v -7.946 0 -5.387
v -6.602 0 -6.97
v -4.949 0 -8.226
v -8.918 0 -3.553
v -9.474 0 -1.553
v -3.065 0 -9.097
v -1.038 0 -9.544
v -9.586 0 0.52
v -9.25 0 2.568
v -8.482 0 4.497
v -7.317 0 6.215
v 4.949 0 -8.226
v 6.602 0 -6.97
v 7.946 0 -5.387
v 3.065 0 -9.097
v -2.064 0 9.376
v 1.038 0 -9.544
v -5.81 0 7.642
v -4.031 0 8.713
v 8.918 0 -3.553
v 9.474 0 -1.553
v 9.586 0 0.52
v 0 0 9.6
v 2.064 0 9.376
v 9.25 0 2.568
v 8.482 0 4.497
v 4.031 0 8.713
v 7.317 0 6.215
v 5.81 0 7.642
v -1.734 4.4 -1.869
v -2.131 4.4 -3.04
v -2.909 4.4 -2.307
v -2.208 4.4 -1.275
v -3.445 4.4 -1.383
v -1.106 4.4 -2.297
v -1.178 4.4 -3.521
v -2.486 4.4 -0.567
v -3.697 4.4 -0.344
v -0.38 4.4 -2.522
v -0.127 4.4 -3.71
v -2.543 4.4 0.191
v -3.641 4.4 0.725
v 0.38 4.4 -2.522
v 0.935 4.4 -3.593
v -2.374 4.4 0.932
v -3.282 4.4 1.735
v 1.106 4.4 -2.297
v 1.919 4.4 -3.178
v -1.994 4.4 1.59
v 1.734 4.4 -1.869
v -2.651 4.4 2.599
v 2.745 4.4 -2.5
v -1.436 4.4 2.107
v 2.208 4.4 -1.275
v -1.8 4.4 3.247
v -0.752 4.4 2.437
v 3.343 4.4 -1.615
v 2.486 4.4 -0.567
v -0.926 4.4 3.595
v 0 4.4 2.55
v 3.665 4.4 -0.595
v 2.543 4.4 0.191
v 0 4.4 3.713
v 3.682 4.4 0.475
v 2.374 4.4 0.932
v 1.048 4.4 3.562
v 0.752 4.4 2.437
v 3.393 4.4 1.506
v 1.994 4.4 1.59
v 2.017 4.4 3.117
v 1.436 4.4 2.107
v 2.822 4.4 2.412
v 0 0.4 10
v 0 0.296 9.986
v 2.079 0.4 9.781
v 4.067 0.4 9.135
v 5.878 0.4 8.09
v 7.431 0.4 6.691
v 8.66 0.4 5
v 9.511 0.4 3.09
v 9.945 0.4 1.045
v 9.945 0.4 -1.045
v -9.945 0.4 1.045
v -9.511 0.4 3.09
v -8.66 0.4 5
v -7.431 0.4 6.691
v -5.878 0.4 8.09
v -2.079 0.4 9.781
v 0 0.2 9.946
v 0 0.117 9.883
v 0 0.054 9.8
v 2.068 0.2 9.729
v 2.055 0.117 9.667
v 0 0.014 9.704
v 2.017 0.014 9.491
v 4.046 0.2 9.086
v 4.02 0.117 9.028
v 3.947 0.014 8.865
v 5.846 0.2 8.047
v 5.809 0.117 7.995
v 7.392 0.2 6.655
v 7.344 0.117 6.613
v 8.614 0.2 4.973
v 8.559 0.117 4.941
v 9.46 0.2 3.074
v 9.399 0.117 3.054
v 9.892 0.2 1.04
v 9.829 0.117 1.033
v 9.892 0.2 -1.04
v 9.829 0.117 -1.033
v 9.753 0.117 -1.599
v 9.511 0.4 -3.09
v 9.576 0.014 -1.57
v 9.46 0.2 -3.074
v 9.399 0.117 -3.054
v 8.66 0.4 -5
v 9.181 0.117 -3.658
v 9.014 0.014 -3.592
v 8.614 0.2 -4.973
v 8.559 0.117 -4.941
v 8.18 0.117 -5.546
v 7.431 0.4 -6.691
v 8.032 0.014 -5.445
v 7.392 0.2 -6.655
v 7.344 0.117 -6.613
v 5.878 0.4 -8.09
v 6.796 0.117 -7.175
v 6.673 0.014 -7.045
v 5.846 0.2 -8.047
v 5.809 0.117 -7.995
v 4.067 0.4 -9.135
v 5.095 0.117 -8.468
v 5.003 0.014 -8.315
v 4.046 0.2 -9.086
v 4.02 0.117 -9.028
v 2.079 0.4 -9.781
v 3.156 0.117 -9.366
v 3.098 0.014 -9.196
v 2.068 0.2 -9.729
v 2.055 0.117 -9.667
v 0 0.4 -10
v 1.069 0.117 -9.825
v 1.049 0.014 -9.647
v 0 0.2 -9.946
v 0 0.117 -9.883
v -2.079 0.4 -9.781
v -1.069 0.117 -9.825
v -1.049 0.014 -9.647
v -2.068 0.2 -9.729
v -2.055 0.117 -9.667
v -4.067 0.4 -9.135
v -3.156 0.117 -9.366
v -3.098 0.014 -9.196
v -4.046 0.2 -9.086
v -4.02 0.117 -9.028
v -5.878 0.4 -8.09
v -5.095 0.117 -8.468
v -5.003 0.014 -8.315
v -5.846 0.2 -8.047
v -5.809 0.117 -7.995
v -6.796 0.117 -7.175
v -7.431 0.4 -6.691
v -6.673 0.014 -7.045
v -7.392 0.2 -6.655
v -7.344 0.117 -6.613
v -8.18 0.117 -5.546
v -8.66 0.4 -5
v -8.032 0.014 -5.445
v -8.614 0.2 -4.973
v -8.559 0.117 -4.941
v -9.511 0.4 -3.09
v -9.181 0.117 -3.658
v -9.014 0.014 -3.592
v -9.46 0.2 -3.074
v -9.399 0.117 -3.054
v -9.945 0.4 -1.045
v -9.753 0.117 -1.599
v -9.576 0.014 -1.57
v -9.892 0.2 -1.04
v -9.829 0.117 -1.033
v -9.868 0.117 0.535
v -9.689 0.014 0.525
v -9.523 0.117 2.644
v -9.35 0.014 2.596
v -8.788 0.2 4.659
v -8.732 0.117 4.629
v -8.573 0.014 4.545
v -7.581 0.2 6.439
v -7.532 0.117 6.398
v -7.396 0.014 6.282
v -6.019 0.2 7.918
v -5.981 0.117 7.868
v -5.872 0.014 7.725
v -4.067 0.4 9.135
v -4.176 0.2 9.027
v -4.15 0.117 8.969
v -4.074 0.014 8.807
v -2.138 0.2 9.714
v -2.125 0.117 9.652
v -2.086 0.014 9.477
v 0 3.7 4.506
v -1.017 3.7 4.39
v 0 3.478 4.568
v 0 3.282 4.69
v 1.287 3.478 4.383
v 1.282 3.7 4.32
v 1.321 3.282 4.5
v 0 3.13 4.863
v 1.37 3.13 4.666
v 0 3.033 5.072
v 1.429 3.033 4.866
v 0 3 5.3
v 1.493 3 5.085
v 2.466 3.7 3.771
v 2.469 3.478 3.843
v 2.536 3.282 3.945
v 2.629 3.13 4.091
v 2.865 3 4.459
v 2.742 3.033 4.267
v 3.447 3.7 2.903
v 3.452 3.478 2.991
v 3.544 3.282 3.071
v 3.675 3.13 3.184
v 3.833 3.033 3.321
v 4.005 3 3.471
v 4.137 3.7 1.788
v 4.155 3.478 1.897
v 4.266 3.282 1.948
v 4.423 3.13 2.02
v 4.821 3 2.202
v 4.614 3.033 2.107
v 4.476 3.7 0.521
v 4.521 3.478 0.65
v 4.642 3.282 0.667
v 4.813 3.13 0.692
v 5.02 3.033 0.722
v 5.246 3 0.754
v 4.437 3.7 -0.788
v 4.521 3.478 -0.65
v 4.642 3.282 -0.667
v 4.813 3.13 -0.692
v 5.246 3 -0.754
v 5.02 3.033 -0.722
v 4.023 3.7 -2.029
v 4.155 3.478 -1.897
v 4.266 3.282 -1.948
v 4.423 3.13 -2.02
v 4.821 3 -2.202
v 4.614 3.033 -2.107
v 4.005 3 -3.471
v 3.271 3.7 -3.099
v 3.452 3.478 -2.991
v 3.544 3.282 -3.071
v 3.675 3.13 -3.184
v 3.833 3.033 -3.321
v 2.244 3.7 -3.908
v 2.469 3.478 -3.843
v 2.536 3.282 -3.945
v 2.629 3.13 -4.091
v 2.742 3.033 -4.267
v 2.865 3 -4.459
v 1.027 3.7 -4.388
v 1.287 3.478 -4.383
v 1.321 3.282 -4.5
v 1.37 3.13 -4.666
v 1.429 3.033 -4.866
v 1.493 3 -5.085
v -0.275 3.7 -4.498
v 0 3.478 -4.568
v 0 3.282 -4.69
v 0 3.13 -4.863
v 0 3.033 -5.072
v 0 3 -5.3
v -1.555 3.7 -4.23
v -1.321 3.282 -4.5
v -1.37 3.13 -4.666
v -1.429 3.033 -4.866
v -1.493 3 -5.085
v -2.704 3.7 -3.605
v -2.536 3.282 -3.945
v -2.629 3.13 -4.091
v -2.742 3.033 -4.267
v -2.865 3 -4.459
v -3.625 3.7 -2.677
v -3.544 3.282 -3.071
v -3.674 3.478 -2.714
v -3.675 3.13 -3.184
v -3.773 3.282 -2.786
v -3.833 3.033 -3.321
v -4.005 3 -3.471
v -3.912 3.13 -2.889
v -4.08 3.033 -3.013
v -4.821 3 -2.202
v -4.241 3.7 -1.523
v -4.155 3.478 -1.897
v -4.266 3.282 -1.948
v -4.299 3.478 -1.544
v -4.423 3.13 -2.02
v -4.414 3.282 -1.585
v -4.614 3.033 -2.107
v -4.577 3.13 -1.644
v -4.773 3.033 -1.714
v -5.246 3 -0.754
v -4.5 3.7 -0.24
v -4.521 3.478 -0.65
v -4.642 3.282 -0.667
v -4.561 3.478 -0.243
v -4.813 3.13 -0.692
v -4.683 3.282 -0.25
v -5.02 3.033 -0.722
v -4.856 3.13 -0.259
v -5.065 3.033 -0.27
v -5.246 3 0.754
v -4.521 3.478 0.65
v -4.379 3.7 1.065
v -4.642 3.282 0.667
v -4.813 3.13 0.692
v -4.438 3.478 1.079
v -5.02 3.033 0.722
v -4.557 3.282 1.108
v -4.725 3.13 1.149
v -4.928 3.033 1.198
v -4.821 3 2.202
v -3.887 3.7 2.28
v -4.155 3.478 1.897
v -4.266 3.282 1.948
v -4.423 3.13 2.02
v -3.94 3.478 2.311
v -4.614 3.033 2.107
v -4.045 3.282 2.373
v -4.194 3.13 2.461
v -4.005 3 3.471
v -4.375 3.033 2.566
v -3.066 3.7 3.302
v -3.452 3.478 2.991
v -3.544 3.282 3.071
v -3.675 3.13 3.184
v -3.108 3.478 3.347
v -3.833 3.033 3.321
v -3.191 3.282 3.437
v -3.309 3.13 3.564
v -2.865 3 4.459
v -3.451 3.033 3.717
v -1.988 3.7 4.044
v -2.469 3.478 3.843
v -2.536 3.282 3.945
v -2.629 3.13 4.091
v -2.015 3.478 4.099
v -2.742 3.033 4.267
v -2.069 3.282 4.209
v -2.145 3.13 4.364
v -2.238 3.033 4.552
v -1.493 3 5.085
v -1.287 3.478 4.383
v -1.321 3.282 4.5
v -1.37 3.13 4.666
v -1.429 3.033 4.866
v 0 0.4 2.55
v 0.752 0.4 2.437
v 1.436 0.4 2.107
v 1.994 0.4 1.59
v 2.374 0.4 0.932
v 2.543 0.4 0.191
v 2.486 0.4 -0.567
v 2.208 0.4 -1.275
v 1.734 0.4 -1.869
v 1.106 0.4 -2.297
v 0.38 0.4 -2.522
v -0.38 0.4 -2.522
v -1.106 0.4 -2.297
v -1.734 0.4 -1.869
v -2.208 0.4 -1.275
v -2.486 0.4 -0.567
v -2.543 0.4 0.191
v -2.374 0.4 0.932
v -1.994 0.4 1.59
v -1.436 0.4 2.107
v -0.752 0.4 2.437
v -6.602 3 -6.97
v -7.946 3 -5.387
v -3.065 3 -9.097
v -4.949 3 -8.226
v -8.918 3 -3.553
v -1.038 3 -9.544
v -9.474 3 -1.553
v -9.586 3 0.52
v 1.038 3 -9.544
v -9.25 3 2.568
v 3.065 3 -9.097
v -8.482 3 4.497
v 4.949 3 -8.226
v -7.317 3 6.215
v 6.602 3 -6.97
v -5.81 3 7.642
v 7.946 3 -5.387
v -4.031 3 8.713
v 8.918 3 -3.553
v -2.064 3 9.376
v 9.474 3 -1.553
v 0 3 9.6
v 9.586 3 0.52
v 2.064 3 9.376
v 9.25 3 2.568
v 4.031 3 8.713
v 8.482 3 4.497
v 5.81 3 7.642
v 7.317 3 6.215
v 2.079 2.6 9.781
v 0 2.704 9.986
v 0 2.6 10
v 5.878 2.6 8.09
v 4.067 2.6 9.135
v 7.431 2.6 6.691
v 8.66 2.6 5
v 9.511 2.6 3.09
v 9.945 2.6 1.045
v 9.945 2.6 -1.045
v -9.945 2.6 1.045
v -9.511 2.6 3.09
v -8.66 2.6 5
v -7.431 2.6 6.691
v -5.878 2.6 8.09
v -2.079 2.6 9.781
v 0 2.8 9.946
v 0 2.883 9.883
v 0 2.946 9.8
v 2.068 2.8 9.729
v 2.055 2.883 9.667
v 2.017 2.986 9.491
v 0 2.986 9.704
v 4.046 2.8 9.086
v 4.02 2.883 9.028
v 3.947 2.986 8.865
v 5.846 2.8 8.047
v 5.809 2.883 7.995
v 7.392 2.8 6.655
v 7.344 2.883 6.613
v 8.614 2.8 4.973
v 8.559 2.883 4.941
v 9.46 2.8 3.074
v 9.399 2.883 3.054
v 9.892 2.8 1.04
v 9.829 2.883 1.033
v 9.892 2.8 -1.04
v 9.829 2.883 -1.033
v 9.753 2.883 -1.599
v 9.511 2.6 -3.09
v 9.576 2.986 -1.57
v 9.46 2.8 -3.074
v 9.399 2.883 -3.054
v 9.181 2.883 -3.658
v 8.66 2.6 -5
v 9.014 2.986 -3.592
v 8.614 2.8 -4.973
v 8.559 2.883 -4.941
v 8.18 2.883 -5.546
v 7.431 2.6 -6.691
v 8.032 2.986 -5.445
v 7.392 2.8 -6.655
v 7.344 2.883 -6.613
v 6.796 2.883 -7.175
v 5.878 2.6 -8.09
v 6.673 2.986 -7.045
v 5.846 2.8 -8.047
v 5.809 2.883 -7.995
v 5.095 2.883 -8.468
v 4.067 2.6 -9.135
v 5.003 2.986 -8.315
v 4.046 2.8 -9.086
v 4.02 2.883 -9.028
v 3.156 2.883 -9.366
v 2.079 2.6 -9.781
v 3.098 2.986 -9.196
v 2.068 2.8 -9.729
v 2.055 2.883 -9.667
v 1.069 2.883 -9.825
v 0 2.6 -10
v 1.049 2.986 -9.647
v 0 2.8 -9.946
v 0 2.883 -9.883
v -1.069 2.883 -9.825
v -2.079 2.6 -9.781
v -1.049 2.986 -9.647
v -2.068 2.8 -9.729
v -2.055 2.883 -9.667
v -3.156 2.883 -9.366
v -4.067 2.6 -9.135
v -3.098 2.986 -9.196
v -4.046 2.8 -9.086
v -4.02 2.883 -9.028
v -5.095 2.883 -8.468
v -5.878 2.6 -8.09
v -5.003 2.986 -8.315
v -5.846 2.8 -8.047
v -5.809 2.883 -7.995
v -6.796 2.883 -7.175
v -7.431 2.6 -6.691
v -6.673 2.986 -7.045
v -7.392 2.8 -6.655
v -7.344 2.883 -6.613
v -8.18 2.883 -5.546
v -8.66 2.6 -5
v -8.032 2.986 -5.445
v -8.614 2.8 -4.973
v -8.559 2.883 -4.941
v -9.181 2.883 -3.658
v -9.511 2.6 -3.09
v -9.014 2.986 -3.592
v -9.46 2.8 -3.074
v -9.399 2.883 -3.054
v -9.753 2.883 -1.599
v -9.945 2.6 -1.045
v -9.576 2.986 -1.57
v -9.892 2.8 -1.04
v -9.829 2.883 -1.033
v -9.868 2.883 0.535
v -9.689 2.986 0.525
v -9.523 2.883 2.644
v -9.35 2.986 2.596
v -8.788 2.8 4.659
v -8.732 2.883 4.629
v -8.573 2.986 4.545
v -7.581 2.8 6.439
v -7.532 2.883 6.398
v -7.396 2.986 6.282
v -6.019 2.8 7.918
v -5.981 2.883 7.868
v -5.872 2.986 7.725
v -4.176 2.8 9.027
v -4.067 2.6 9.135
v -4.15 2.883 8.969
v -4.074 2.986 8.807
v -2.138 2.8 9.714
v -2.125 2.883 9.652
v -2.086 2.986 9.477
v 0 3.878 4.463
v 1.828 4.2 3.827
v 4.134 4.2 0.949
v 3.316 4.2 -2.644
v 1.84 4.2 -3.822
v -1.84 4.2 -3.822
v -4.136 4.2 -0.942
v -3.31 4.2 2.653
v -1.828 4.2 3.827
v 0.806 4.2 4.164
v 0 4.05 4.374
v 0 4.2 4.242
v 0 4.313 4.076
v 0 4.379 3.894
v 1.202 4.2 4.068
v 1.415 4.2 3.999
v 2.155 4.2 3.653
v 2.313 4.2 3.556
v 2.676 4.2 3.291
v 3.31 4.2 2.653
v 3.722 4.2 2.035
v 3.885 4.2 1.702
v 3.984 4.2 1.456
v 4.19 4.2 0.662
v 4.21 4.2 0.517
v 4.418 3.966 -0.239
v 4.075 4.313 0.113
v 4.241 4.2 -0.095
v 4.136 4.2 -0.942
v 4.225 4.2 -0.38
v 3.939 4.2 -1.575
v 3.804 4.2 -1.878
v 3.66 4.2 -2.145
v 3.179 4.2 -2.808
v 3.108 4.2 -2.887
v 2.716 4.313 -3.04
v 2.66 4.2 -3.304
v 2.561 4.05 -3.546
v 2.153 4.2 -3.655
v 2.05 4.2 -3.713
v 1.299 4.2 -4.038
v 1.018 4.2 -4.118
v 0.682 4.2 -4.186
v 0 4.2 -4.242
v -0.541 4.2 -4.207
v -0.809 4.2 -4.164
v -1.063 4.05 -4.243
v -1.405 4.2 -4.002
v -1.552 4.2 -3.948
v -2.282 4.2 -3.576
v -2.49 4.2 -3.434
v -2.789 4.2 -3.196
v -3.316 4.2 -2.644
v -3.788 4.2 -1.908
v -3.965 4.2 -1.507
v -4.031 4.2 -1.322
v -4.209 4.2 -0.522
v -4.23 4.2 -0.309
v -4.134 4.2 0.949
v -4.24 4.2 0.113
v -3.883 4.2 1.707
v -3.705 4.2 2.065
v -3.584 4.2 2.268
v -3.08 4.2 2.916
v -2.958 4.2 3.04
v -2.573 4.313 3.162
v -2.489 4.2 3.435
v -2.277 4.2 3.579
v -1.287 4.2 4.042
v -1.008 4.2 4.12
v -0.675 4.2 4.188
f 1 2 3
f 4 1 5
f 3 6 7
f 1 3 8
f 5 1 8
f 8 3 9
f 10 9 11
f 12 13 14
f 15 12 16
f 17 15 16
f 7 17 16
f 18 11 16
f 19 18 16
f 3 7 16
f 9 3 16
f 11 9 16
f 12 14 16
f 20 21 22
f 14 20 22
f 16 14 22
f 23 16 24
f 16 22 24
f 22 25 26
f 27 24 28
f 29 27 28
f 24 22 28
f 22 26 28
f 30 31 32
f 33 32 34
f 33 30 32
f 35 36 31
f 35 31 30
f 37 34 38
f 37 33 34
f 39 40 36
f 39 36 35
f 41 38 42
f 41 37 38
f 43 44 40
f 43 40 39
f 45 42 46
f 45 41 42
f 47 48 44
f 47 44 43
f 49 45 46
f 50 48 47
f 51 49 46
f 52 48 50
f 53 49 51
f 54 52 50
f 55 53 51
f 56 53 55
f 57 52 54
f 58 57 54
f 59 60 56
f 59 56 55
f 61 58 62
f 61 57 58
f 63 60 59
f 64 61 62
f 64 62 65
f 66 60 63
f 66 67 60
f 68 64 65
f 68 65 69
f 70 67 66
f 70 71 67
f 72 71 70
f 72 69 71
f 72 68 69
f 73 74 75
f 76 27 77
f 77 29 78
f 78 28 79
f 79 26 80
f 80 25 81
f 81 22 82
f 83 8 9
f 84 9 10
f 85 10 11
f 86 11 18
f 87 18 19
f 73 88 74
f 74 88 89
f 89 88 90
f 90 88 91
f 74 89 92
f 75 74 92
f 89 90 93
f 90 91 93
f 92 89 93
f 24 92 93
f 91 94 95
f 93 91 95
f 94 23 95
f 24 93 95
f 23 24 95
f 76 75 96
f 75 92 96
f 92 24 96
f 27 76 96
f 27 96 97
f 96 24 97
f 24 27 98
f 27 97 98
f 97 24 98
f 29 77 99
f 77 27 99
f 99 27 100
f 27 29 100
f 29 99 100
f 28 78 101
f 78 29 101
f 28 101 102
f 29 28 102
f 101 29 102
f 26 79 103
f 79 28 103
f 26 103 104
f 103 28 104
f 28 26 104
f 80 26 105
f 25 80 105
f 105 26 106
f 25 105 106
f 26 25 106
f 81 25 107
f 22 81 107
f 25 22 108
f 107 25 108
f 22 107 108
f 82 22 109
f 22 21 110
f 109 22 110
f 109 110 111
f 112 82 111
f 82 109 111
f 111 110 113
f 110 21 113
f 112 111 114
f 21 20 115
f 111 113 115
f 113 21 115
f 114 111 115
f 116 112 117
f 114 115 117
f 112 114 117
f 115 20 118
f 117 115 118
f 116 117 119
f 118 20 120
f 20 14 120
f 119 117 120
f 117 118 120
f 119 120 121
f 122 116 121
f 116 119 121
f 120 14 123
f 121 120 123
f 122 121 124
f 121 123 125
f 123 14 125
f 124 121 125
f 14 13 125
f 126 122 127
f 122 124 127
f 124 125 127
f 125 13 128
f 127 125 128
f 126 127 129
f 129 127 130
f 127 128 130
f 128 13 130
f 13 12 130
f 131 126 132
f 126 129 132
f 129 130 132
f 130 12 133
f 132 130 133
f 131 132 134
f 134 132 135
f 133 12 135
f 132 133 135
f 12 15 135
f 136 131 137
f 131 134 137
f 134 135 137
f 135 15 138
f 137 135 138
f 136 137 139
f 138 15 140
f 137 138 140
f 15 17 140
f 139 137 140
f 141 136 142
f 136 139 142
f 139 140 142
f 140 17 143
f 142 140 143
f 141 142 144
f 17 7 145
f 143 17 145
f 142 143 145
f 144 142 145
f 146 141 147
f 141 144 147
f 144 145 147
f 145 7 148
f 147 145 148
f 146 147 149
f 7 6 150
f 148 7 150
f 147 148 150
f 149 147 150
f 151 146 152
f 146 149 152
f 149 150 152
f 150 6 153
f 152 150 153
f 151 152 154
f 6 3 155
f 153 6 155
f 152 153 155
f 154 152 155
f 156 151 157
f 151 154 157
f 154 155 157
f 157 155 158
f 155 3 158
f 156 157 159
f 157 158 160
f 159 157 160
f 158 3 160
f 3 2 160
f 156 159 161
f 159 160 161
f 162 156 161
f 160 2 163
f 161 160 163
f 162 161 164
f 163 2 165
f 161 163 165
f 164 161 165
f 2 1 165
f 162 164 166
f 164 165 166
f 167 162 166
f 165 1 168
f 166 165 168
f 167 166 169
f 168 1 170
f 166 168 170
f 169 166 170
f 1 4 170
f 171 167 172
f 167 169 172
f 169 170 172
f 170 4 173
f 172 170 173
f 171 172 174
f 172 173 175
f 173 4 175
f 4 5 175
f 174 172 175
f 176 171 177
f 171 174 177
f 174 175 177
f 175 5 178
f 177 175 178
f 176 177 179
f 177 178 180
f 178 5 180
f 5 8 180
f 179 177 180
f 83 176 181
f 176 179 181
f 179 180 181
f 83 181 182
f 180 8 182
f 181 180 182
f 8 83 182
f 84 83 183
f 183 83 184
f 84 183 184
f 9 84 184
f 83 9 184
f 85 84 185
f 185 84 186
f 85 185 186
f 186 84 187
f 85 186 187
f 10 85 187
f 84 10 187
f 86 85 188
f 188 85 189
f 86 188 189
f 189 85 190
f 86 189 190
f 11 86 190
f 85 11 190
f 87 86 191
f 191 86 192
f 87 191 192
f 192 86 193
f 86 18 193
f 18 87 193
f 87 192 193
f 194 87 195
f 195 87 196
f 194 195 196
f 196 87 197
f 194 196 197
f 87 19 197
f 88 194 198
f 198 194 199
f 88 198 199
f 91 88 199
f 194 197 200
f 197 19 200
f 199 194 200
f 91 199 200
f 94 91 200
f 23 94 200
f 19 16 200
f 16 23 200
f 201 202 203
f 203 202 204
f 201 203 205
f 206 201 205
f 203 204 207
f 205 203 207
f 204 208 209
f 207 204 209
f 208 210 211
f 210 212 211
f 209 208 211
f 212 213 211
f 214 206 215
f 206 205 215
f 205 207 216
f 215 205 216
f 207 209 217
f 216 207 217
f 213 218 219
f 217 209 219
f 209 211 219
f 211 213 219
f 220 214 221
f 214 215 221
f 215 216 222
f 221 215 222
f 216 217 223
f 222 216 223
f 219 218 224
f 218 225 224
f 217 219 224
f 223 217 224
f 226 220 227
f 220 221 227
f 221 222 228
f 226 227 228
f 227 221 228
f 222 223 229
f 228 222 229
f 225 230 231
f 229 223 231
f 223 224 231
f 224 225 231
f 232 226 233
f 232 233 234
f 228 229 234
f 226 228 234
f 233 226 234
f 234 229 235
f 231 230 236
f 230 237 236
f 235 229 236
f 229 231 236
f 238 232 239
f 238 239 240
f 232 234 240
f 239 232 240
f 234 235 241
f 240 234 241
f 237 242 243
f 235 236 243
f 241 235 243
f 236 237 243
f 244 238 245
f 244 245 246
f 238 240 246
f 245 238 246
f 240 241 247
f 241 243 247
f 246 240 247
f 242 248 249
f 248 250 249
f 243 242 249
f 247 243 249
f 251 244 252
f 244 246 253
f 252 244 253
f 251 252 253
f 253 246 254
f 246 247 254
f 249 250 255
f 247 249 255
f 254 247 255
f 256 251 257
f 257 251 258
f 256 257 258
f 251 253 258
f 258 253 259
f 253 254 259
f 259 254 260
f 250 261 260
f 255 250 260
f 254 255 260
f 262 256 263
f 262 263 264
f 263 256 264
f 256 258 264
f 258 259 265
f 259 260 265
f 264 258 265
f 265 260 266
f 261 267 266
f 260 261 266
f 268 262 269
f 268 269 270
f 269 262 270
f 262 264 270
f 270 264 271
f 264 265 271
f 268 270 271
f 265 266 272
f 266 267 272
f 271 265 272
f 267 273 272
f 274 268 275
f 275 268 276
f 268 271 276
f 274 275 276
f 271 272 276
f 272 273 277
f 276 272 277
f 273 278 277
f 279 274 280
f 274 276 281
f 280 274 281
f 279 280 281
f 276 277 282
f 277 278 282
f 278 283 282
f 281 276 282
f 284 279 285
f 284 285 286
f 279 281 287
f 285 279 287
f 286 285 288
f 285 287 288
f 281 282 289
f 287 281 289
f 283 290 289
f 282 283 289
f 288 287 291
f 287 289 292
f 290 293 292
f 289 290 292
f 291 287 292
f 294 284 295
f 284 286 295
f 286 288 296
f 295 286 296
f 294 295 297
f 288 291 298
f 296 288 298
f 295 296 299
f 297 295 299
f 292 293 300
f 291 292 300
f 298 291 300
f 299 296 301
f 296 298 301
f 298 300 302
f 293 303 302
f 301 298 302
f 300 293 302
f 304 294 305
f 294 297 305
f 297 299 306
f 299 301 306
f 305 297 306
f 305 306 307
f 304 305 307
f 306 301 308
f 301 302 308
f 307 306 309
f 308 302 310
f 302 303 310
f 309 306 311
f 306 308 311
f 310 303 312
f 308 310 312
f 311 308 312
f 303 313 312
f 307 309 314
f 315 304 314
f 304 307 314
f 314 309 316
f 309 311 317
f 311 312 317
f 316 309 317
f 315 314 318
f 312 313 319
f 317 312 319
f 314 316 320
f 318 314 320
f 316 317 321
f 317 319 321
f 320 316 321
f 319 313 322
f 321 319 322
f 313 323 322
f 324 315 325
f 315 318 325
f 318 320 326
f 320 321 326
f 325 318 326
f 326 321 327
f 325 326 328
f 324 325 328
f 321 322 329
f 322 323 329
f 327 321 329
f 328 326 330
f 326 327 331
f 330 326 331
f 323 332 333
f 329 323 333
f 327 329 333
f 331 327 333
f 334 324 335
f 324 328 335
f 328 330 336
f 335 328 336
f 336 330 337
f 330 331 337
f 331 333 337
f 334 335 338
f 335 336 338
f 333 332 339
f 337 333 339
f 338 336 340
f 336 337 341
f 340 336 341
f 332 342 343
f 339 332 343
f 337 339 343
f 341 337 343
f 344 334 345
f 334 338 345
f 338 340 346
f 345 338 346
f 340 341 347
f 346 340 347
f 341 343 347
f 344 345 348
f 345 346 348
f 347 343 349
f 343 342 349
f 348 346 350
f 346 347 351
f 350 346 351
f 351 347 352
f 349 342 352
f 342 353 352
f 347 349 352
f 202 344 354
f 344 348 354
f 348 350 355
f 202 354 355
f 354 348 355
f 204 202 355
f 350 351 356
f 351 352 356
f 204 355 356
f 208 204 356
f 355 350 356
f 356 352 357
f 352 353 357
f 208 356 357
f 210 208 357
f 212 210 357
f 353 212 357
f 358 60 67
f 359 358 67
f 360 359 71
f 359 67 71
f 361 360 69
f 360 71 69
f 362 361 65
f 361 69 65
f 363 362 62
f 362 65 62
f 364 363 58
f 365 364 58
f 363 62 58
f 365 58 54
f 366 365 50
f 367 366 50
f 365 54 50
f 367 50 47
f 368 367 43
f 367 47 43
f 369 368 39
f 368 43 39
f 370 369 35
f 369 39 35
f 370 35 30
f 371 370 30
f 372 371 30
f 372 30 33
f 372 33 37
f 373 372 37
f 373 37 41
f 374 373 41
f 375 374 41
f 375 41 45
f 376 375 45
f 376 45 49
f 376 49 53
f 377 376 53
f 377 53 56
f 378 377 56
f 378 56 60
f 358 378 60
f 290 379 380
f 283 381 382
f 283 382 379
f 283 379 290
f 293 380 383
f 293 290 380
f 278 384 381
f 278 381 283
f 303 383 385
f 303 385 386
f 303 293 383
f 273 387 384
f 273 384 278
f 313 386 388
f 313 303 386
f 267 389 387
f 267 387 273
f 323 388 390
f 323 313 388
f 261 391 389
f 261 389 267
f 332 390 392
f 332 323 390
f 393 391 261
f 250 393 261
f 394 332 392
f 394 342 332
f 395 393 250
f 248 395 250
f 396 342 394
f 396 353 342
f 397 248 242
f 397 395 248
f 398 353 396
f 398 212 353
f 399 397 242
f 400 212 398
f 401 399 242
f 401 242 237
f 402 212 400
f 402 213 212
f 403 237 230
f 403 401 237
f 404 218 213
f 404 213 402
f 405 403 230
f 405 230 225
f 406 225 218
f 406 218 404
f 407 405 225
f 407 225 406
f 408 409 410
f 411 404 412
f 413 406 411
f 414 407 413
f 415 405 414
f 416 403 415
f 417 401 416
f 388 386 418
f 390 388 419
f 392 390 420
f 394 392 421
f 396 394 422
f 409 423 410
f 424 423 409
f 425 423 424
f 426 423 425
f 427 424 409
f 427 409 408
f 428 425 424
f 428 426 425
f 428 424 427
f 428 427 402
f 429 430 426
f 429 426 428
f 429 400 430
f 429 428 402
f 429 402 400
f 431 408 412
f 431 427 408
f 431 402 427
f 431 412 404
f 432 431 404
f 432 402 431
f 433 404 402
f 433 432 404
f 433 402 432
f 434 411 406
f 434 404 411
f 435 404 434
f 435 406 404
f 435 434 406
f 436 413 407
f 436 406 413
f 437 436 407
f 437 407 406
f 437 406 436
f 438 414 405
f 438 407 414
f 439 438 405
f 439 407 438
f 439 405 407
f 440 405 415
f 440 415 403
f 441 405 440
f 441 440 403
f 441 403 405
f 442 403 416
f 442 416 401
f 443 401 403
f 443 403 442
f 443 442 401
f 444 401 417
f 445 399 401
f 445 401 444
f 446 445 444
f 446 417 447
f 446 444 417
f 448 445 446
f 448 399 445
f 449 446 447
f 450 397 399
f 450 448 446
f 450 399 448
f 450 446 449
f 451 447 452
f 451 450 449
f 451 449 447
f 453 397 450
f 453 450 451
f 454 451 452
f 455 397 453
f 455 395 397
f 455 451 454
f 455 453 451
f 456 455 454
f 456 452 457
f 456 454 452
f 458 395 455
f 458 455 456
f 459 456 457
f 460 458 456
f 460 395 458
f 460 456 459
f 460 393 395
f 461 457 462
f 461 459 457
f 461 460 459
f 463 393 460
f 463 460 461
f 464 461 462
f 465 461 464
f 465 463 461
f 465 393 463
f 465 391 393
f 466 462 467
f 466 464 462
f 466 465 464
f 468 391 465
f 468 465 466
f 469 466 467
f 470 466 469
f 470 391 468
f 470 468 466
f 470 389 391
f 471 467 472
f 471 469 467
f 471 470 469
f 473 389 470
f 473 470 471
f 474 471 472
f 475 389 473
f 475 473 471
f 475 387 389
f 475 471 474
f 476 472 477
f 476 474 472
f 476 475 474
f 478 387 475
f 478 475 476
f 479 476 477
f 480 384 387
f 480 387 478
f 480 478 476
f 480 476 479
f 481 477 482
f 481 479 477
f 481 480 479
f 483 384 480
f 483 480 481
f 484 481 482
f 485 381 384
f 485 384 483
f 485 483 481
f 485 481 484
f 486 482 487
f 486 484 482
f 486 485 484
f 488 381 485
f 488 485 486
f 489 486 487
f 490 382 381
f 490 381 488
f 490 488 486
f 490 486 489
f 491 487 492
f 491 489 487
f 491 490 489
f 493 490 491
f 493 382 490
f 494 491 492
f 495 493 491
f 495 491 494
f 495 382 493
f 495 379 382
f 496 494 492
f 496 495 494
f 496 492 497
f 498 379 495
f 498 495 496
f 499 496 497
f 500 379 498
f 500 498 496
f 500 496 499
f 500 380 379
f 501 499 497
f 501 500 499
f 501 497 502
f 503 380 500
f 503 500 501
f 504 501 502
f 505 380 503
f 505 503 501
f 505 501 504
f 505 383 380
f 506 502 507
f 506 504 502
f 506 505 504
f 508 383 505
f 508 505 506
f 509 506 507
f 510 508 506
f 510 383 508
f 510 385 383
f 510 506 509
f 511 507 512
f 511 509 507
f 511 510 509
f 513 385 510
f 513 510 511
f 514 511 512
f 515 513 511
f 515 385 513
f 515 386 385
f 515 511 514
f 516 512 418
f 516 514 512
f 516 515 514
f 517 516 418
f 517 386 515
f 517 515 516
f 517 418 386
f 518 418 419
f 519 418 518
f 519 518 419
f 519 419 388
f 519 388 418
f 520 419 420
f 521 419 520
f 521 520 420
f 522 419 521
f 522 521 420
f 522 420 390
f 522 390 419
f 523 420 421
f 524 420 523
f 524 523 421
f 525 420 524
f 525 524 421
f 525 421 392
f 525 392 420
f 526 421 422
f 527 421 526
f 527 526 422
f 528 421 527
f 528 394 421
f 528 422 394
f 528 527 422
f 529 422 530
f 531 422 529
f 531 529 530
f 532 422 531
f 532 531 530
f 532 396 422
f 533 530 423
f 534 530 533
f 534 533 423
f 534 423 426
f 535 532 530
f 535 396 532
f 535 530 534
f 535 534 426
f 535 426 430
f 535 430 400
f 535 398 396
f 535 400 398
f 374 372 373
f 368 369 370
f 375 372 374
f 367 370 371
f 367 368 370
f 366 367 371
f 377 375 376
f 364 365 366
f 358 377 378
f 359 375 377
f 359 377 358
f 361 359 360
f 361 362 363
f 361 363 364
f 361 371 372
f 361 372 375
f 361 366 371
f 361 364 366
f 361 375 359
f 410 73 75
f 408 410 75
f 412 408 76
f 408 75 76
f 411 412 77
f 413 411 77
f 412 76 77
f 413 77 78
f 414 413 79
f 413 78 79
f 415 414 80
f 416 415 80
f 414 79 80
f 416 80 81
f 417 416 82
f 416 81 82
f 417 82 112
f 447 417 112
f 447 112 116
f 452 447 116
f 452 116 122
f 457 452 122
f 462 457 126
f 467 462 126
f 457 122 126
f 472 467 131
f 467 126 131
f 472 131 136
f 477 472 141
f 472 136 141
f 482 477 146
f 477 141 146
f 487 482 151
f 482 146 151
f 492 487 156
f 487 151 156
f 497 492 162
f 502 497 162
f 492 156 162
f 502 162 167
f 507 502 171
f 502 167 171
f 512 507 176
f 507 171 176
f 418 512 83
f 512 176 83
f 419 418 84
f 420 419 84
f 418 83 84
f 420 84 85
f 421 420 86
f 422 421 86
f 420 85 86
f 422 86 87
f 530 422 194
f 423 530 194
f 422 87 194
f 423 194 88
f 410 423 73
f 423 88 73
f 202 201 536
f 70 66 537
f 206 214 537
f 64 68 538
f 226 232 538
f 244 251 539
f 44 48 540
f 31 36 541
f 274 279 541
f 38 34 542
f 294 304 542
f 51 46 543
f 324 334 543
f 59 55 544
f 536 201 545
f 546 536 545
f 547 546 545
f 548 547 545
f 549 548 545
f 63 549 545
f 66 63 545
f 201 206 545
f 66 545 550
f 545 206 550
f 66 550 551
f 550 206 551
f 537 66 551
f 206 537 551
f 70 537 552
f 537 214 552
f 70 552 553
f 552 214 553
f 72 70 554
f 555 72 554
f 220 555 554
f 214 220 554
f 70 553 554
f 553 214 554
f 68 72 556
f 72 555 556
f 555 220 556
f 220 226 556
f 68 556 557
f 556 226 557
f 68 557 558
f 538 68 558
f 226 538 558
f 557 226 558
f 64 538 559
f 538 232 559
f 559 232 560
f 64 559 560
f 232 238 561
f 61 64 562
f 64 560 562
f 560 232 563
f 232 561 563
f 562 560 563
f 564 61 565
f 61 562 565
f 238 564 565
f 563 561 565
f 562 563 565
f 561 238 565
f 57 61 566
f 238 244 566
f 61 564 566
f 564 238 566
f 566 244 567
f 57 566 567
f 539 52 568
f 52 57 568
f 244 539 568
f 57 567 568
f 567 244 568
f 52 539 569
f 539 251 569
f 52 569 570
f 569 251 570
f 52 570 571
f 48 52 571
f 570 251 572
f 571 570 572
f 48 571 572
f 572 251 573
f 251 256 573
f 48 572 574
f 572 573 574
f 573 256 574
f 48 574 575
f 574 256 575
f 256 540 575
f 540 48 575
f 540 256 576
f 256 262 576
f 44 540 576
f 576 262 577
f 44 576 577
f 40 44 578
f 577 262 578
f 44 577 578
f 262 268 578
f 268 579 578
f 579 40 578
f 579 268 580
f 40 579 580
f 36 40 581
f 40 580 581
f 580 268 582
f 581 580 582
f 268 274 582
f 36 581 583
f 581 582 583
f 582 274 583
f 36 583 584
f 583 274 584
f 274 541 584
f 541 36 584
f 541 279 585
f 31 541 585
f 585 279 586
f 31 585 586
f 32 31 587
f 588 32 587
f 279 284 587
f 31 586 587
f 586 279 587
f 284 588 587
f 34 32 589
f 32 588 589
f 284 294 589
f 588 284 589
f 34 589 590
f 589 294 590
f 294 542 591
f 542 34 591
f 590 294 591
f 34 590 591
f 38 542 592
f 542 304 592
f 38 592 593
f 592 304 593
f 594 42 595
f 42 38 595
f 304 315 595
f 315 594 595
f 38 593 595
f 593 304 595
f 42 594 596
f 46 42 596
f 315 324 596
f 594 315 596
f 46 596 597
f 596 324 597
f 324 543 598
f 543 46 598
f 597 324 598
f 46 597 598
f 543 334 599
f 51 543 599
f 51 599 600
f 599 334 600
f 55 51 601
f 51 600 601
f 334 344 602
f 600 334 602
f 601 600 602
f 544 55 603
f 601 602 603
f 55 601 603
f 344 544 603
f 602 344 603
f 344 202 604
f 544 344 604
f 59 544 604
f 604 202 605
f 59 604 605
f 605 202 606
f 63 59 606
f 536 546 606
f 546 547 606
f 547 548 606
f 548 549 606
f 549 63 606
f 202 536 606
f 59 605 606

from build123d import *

# Parameters (mm, degrees)
SKETCH1_R           = 10
BOSS_EXTRUDE1_DEPTH = 3
SKETCH2_R           = 2.55
CUT_EXTRUDE1_DEPTH  = 2.6
FILLET1_R           = 0.4
BOSS_EXTRUDE2_START = 1.4
SKETCH3_R           = 4.5
SKETCH3_R_2         = 2.55
BOSS_EXTRUDE2_DEPTH = 1.4
FILLET2_R           = 0.8
FILLET3_R           = 0.8


with BuildPart() as part:
    # Sketch1 → Boss-Extrude1 (new body)
    with BuildSketch(Plane(origin=(0, 0, 0), x_dir=(1, 0, 0), z_dir=(0, 1, 0))):
        with Locations(Location((0, 0, 0), (0, 0, 270))):
            Circle(SKETCH1_R)
    extrude(amount=BOSS_EXTRUDE1_DEPTH)

    # Sketch2 → Cut-Extrude1 (cut)
    with BuildSketch(Plane(origin=(0, 3, 0), x_dir=(1, 0, 0), z_dir=(0, 1, 0))):
        with Locations(Location((0, 0, 0), (0, 0, 270))):
            Circle(SKETCH2_R)
    extrude(amount=-CUT_EXTRUDE1_DEPTH, mode=Mode.SUBTRACT)

    # Fillet1
    fillet1_edges = [part.edges().sort_by_distance(p)[0] for p in [
        (0, 0, -10),
        (0, 3, -10),
    ]]
    fillet(fillet1_edges, radius=FILLET1_R)

    # Sketch3 → Boss-Extrude2 (add)
    with BuildSketch(Plane(origin=(0, 3, 0), x_dir=(1, 0, 0), z_dir=(0, 1, 0)).offset(BOSS_EXTRUDE2_START)):
        with Locations(Location((0, 0, 0), (0, 0, 270))):
            Circle(SKETCH3_R)
        with Locations(Location((0, 0, 0), (0, 0, 270))):
            Circle(SKETCH3_R_2, mode=Mode.SUBTRACT)
    extrude(amount=-BOSS_EXTRUDE2_DEPTH)

    # Fillet2
    fillet2_edges = [part.edges().sort_by_distance(p)[0] for p in [
        (0, 3, -4.5),
    ]]
    fillet(fillet2_edges, radius=FILLET2_R)

    # Fillet3
    fillet3_edges = [part.edges().sort_by_distance(p)[0] for p in [
        (0, 4.4, -4.5),
    ]]
    fillet(fillet3_edges, radius=FILLET3_R)


solid = part.part
